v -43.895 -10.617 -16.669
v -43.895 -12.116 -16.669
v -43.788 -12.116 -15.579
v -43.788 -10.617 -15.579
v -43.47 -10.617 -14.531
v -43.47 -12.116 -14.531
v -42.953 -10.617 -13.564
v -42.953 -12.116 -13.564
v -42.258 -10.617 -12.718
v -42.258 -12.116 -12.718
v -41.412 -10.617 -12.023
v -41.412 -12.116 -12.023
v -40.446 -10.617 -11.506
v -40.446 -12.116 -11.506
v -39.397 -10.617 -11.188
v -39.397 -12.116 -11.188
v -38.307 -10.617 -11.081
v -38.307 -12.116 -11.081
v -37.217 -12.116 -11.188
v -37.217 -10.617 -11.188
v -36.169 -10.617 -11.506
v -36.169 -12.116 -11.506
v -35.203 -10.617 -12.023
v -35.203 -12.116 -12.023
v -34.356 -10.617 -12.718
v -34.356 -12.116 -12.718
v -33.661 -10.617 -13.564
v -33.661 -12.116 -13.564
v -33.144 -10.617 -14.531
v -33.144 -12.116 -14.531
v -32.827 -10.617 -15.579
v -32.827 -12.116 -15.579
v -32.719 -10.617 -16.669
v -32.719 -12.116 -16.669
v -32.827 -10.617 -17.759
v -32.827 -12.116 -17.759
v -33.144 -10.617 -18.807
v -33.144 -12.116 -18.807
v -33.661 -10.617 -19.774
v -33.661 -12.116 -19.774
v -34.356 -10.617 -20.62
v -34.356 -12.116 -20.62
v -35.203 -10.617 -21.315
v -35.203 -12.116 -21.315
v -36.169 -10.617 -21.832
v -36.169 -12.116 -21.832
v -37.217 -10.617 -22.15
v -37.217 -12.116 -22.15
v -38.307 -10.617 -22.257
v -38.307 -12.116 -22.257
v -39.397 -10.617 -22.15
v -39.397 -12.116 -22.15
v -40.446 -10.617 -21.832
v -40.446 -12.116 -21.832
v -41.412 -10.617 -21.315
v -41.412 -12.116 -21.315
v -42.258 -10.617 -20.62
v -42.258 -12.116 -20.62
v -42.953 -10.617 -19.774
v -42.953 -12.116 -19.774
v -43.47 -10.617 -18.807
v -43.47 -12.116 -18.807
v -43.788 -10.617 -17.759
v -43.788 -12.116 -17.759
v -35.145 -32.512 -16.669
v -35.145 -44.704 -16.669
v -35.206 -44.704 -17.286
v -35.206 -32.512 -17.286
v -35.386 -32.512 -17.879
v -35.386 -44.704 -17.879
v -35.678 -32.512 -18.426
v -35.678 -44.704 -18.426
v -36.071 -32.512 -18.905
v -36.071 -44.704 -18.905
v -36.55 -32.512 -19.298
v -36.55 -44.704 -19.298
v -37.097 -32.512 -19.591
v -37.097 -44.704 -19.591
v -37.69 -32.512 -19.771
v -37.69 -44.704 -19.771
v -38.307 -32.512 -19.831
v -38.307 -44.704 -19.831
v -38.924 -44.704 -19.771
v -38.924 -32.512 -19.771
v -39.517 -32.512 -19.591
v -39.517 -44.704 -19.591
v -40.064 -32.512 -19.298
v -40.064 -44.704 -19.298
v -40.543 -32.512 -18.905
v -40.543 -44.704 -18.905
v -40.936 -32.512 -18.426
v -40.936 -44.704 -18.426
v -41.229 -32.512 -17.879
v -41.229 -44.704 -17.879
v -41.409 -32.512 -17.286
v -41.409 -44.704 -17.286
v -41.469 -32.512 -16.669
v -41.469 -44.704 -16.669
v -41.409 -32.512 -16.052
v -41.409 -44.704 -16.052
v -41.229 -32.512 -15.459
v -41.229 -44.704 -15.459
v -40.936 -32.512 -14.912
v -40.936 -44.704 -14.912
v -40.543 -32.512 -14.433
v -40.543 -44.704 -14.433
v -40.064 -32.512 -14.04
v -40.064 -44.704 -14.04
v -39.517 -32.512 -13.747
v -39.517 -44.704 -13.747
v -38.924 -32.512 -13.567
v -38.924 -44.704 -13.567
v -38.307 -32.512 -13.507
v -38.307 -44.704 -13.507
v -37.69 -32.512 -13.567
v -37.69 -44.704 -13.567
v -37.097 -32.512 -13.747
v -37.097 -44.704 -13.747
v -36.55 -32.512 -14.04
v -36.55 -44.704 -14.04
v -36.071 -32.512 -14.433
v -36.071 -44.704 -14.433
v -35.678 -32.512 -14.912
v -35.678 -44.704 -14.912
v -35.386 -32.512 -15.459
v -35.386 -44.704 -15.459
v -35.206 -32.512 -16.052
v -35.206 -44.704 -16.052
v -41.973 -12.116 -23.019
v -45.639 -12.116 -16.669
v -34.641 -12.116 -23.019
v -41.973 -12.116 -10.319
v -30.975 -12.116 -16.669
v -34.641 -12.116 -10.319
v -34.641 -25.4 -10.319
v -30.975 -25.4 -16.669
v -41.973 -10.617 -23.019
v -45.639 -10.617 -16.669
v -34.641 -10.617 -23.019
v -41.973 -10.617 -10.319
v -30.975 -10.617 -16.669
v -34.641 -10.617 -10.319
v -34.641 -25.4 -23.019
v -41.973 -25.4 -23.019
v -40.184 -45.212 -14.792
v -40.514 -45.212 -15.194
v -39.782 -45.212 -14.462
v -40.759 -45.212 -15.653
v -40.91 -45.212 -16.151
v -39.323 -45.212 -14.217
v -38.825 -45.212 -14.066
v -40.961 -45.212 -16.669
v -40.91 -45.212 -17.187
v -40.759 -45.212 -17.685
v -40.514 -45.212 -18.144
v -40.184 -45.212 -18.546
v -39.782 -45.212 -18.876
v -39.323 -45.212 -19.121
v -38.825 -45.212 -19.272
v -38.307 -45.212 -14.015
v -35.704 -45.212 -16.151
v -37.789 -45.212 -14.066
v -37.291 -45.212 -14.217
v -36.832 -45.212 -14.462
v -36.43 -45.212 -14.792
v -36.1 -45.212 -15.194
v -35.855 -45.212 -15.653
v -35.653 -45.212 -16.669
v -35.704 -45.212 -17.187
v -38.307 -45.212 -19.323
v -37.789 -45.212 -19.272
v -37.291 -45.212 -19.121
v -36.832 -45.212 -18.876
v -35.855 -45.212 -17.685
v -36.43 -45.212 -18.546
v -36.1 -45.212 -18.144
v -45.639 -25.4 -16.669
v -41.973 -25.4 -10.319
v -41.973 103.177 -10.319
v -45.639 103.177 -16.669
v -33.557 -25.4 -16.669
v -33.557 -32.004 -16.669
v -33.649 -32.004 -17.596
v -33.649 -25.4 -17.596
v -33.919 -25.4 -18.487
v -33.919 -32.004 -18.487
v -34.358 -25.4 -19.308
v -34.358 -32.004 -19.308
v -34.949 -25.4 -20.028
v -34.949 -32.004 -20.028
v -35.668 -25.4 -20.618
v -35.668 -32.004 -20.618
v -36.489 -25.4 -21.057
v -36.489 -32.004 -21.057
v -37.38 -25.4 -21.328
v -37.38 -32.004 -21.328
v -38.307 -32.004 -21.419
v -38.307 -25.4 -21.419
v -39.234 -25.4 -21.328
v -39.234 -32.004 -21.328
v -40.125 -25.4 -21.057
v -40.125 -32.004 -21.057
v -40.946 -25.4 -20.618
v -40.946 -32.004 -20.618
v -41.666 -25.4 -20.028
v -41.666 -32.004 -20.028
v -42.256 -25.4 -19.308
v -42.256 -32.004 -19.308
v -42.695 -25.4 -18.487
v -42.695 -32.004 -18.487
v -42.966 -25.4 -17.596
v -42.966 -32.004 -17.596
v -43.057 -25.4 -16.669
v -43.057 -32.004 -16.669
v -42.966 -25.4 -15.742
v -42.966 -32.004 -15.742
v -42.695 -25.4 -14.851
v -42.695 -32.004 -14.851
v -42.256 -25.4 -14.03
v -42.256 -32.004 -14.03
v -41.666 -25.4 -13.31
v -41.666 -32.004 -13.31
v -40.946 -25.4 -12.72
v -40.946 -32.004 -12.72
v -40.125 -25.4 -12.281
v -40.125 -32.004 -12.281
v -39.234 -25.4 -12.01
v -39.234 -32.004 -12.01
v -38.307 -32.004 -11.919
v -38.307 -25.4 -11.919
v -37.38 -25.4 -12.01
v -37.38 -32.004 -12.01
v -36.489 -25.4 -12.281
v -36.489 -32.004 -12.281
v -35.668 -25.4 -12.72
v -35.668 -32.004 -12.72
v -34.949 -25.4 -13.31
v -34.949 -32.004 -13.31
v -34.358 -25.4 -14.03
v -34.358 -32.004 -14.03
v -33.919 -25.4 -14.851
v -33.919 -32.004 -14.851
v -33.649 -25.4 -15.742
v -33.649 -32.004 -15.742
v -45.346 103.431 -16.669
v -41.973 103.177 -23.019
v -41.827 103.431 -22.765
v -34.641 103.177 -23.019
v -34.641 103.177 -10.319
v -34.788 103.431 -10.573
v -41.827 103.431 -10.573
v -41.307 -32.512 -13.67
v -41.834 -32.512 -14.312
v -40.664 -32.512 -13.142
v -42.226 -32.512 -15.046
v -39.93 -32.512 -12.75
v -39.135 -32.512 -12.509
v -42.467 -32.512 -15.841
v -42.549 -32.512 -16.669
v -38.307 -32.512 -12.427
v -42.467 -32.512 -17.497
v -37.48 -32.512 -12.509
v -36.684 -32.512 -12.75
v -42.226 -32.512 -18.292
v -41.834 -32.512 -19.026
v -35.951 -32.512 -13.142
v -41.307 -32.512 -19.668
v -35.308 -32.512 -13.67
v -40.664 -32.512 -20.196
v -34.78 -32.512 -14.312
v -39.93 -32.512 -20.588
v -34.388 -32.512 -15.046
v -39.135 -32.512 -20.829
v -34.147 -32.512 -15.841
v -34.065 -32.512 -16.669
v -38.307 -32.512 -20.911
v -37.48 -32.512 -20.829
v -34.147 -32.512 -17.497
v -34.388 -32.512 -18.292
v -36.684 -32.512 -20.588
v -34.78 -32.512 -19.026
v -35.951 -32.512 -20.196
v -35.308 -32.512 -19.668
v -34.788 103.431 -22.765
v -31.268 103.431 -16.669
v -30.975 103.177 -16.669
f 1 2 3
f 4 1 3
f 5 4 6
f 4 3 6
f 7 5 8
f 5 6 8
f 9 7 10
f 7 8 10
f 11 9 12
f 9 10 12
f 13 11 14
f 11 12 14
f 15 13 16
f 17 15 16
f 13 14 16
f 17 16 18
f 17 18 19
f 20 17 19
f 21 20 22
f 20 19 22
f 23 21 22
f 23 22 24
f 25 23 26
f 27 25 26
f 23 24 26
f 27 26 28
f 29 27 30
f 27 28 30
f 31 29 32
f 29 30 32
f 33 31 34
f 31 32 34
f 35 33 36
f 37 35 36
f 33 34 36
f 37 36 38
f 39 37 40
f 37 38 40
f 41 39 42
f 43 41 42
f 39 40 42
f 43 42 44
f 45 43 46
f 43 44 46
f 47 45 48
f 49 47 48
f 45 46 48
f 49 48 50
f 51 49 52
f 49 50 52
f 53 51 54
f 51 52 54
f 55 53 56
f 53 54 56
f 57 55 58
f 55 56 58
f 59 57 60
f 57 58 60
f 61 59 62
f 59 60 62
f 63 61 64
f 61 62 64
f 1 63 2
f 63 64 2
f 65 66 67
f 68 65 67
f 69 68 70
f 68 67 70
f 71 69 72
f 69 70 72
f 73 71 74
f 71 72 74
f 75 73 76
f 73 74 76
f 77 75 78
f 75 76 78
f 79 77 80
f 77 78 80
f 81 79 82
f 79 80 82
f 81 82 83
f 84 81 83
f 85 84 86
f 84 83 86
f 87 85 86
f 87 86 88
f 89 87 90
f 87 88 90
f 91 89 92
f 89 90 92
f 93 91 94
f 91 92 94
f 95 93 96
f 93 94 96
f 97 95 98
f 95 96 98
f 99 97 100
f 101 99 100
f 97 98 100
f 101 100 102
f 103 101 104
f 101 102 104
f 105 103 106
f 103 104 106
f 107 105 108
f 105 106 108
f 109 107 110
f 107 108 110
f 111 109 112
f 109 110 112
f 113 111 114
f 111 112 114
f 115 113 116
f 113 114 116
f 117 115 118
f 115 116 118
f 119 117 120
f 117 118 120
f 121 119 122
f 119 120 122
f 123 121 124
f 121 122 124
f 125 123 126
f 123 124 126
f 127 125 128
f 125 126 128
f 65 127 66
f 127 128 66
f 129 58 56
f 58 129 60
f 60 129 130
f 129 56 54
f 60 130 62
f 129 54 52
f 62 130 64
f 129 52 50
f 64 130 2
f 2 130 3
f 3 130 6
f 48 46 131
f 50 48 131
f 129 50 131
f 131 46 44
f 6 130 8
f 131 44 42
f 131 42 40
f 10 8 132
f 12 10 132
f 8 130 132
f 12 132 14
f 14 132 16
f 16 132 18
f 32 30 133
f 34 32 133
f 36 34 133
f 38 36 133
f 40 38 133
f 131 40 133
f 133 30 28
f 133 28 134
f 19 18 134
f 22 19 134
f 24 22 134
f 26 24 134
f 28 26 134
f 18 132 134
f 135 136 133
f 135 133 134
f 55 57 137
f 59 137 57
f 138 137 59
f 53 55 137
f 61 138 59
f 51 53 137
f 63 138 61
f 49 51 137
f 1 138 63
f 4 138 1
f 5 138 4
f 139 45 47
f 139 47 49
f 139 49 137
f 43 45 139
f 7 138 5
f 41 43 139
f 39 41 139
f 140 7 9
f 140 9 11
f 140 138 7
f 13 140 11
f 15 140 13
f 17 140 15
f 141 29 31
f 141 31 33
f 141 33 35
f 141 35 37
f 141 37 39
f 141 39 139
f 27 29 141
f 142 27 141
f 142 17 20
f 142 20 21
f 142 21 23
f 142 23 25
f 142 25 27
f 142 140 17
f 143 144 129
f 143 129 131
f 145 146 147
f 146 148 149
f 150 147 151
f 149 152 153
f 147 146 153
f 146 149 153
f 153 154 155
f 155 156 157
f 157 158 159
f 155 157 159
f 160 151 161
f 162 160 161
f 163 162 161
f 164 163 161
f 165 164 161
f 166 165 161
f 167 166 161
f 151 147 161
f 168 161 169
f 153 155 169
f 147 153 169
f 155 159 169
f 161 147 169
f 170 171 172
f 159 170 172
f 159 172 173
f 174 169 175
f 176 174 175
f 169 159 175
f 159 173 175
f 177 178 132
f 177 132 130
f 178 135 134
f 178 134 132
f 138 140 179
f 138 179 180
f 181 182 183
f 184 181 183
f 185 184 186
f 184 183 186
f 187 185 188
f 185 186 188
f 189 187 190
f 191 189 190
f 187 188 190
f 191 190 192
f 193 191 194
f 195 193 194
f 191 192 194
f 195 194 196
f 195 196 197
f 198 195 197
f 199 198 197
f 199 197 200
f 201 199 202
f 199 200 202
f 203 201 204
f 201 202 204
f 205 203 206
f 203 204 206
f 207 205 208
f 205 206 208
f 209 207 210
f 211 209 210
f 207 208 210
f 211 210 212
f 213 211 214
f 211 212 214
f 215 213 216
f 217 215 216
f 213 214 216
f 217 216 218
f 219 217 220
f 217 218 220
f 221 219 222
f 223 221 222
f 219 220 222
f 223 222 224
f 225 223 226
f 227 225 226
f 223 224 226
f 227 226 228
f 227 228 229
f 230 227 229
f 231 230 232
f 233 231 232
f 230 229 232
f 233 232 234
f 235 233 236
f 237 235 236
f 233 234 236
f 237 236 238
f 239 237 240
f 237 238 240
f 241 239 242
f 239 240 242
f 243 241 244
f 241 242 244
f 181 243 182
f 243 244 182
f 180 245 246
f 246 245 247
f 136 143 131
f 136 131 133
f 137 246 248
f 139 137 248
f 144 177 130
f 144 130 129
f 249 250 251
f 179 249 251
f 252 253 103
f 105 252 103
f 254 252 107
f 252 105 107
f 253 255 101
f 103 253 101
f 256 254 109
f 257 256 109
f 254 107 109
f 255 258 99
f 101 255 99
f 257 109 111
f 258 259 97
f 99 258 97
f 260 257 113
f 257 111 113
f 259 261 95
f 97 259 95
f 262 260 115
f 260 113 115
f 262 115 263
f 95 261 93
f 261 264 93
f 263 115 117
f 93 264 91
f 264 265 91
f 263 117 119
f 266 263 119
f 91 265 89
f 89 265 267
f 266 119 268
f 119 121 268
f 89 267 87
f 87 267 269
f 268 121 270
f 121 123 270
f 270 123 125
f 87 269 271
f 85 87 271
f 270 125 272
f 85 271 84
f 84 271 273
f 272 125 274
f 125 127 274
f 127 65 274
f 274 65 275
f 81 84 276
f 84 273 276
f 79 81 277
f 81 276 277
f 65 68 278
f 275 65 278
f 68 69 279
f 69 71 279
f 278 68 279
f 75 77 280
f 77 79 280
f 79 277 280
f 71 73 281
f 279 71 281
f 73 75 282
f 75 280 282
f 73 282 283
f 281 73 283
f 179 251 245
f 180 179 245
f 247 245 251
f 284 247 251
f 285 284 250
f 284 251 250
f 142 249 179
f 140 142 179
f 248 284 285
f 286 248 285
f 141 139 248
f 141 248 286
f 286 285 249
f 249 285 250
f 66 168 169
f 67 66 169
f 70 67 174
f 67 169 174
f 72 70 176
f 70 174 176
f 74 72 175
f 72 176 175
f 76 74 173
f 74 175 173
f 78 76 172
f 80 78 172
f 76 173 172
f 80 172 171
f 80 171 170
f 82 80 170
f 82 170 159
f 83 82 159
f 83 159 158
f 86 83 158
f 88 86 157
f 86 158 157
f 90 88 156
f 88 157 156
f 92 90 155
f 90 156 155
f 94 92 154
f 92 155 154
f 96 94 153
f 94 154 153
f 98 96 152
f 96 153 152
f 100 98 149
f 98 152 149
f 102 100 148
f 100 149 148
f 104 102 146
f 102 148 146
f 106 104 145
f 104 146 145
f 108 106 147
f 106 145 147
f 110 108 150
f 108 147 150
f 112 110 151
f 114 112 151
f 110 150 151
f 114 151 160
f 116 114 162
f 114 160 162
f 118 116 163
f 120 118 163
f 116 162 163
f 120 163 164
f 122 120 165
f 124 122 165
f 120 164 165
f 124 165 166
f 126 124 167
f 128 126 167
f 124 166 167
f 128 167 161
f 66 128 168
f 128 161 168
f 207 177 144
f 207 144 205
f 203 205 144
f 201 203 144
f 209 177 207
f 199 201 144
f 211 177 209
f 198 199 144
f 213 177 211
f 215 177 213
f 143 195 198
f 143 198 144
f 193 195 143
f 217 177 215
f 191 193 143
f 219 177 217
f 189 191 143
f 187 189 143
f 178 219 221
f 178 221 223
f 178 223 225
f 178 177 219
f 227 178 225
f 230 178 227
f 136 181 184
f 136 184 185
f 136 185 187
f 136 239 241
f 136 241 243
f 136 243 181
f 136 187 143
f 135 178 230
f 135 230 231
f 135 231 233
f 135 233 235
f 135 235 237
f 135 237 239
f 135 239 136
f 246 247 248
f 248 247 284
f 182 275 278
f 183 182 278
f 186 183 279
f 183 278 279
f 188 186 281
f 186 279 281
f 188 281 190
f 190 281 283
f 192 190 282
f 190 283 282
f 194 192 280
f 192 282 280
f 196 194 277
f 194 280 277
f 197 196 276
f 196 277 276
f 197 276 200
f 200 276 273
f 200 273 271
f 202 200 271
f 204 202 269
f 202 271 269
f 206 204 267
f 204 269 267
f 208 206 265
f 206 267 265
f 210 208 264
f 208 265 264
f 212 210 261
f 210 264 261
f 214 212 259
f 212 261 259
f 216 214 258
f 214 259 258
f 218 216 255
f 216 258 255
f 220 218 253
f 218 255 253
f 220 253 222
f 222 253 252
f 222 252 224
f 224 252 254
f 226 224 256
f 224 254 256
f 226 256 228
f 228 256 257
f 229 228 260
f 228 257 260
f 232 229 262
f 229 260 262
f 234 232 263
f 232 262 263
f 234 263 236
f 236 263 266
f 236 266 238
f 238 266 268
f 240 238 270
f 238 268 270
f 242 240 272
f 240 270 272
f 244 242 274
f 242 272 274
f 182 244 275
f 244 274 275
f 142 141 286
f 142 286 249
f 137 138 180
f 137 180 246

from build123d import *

# Parameters (mm, degrees)
BOSS_EXTRUDE1_DEPTH = 13.2842
SKETCH2_R           = 5.588
BOSS_EXTRUDE2_DEPTH = 1.4986
BOSS_EXTRUDE3_DEPTH = 114.04854
CHAMFER1_SIZE       = 0.508
CHAMFER2_SIZE       = 0.254


with BuildPart() as part:
    # Sketch1 → Boss-Extrude1 (new body)
    with BuildSketch(Plane.XZ.offset(25.4)):
        Polygon((-45.639482135, -16.669011646), (-41.973307925, -23.019011646), (-34.640959507, -23.019011646), (-30.974785297, -16.669011646), (-34.640959507, -10.319011646), (-41.973307925, -10.319011646), align=None)
    extrude(amount=-BOSS_EXTRUDE1_DEPTH)

    # Sketch2 → Boss-Extrude2 (add)
    with BuildSketch(Plane(origin=(0, -12.1158, 0), x_dir=(-1, 0, 0), z_dir=(0, 1, 0))):
        with Locations((38.307133716, -16.669011646)):
            Circle(SKETCH2_R)
    extrude(amount=BOSS_EXTRUDE2_DEPTH)

    # Sketch3 → Boss-Extrude3 (add)
    with BuildSketch(Plane.XZ.offset(10.6172)):
        Polygon((-45.639482135, -16.669011646), (-41.973307925, -23.019011646), (-34.640959507, -23.019011646), (-30.974785297, -16.669011646), (-34.640959507, -10.319011646), (-41.973307925, -10.319011646), align=None)
    extrude(amount=-BOSS_EXTRUDE3_DEPTH)

    # Sketch4 → Revolve1 (revolve)
    with BuildSketch(Plane(origin=(0, 0, -16.669011646), x_dir=(-1, 0, 0), z_dir=(0, 0, -1))):
        Polygon((35.144833716, -45.212), (38.307133716, -45.212), (38.307133716, -25.4), (33.557333716, -25.4), (33.557333716, -32.512), (35.144833716, -32.512), align=None)
    revolve(axis=Axis((-38.307133716, -45.212, -16.669011646), (0, 1, 0)))

    # Chamfer1
    chamfer1_edges = [part.edges().sort_by_distance(p)[0] for p in [
        (-41.469433716, -45.212, -16.669011646),
        (-43.056933716, -32.512, -16.669011646),
    ]]
    chamfer(chamfer1_edges, length=CHAMFER1_SIZE)

    # Chamfer2
    chamfer2_edges = [part.edges().sort_by_distance(p)[0] for p in [
        (-43.80639503, 103.43134, -13.494011646),
        (-38.307133716, 103.43134, -10.319011646),
        (-32.807872402, 103.43134, -13.494011646),
        (-32.807872402, 103.43134, -19.844011646),
        (-38.307133716, 103.43134, -23.019011646),
        (-43.80639503, 103.43134, -19.844011646),
    ]]
    chamfer(chamfer2_edges, length=CHAMFER2_SIZE)


solid = part.part
